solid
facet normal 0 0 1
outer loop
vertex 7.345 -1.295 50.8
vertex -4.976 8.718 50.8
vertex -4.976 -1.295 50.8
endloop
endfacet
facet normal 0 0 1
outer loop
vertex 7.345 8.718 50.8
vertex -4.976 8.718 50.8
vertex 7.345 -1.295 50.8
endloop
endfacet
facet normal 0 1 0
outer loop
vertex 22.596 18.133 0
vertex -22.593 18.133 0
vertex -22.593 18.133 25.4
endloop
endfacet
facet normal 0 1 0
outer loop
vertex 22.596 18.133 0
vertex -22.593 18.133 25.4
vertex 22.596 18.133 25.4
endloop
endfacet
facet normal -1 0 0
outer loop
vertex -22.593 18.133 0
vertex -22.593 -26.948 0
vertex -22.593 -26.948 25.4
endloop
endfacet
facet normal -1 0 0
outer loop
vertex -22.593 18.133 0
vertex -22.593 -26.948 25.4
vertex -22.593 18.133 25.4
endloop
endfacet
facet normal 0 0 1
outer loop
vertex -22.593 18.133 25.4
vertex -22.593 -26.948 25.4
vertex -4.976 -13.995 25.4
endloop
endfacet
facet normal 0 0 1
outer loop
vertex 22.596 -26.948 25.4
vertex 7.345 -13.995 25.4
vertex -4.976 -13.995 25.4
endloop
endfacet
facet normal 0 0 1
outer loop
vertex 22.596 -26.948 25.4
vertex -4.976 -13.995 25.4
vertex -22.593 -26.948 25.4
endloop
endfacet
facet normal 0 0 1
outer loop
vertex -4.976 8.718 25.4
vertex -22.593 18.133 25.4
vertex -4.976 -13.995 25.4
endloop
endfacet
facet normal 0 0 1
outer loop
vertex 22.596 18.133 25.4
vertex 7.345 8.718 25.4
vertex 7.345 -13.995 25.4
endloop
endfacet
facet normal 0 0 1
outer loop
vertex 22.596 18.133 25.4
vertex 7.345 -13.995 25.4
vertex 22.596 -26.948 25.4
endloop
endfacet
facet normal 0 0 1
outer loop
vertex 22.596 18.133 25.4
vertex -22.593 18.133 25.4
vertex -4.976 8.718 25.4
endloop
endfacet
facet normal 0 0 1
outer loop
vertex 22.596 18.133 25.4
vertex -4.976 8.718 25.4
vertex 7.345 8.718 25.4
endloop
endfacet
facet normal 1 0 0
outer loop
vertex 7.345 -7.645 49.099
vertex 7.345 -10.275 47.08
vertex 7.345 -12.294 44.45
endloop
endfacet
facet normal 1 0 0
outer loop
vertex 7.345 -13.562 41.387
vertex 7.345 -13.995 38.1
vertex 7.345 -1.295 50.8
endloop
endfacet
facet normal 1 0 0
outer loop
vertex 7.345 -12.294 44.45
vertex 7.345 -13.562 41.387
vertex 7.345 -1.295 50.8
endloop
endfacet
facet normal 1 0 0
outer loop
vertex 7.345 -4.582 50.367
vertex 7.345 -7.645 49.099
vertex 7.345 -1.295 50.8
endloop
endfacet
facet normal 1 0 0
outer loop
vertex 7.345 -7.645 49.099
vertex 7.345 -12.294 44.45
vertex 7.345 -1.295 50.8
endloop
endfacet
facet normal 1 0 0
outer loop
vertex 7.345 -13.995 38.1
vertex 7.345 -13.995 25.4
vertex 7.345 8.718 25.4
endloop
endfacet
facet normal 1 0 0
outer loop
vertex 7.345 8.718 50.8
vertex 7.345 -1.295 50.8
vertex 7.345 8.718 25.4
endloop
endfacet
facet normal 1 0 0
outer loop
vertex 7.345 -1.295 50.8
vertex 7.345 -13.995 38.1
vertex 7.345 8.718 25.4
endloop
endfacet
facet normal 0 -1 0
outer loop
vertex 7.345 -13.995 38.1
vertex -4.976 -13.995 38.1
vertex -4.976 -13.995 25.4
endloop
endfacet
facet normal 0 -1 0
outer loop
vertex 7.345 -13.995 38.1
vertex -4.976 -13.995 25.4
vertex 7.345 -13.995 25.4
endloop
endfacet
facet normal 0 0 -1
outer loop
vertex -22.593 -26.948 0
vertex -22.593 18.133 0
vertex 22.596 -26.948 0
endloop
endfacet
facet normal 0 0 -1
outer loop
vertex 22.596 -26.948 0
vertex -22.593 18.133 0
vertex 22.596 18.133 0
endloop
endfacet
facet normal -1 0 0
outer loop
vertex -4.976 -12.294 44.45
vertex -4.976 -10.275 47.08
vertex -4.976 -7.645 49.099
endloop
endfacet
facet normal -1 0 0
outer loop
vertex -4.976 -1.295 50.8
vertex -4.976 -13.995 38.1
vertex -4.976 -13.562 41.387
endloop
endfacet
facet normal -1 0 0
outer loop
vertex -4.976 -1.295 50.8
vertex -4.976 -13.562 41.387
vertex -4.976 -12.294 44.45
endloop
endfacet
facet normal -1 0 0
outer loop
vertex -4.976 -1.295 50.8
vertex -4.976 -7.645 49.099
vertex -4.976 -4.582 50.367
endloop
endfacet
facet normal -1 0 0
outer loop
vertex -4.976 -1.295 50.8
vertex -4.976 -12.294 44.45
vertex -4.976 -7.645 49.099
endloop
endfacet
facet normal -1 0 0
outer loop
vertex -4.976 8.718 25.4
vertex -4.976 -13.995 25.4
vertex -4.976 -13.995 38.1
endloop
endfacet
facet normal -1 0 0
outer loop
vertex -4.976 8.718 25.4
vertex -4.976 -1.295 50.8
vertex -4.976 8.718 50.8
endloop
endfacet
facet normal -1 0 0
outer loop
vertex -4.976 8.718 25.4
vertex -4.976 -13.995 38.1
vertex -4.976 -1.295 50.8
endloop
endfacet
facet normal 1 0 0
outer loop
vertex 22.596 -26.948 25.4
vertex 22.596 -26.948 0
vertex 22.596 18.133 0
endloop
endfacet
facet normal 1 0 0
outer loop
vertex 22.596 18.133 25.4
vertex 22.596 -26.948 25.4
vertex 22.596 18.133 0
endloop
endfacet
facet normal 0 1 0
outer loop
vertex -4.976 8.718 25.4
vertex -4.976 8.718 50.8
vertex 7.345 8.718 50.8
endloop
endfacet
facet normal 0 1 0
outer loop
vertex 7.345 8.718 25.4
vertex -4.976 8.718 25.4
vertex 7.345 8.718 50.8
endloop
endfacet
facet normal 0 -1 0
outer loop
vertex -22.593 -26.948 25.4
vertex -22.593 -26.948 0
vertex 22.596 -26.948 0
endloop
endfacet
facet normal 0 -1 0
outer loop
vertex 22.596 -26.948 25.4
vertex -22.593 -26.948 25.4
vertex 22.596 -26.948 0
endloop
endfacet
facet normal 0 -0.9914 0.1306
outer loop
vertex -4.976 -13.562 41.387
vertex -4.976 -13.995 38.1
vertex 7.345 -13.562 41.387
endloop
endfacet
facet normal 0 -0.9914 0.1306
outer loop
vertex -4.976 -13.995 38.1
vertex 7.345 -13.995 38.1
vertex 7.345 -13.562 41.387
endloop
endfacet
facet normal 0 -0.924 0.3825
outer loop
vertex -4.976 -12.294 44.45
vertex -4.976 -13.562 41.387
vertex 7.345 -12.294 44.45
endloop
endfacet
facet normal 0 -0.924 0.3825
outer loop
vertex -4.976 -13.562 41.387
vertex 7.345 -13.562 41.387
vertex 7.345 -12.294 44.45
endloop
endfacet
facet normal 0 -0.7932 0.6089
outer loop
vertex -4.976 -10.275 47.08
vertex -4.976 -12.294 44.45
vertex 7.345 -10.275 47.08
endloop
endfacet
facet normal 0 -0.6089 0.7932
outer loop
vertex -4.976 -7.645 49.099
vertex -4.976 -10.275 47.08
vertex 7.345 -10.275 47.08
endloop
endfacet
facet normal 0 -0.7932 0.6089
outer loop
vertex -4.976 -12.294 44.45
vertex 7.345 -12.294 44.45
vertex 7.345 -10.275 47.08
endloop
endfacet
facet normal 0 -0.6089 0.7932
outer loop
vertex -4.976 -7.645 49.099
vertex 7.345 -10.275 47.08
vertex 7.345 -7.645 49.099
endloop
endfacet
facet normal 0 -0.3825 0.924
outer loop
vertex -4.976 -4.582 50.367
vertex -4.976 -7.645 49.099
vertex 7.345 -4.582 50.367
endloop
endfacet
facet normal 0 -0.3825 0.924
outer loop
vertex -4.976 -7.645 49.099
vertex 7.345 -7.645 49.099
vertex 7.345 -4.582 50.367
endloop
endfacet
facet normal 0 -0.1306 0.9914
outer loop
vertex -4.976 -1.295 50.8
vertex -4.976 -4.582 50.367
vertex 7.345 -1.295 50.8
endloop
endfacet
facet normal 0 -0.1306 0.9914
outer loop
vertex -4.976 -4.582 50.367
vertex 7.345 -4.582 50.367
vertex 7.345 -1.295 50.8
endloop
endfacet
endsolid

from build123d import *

# Parameters (mm, degrees)
F0_W     = 45.1892055571
F0_H     = 45.0811590999
F1_DEPTH = 25.4
F2_W     = 12.3209874146
F2_H     = 22.7134097368
F3_DEPTH = 25.4
F4_R     = 12.7


# Not quite as in the source:
# - the program builds the solid bodies; features that only make, move or delete a surface that nothing else refers to are left out


with BuildPart() as f1:
    # F0 (on Top) → F1 (new body)
    with BuildSketch(Plane.XY):
        with Locations((0.0014137477, -4.4078445062)):
            Rectangle(F0_W, F0_H)
    extrude(amount=F1_DEPTH)

    # F2 (on face) → F3 (join)
    with BuildSketch(Plane.XY.offset(25.4)):
        with Locations((1.1841731612, -2.6384368539)):
            Rectangle(F2_W, F2_H)
    extrude(amount=F3_DEPTH)

    # F4
    f4_edges = [f1.edges().sort_by_distance(p)[0] for p in [
        (1.184173, -13.995142, 50.8),
    ]]
    fillet(f4_edges, radius=F4_R)


solid = f1.part
